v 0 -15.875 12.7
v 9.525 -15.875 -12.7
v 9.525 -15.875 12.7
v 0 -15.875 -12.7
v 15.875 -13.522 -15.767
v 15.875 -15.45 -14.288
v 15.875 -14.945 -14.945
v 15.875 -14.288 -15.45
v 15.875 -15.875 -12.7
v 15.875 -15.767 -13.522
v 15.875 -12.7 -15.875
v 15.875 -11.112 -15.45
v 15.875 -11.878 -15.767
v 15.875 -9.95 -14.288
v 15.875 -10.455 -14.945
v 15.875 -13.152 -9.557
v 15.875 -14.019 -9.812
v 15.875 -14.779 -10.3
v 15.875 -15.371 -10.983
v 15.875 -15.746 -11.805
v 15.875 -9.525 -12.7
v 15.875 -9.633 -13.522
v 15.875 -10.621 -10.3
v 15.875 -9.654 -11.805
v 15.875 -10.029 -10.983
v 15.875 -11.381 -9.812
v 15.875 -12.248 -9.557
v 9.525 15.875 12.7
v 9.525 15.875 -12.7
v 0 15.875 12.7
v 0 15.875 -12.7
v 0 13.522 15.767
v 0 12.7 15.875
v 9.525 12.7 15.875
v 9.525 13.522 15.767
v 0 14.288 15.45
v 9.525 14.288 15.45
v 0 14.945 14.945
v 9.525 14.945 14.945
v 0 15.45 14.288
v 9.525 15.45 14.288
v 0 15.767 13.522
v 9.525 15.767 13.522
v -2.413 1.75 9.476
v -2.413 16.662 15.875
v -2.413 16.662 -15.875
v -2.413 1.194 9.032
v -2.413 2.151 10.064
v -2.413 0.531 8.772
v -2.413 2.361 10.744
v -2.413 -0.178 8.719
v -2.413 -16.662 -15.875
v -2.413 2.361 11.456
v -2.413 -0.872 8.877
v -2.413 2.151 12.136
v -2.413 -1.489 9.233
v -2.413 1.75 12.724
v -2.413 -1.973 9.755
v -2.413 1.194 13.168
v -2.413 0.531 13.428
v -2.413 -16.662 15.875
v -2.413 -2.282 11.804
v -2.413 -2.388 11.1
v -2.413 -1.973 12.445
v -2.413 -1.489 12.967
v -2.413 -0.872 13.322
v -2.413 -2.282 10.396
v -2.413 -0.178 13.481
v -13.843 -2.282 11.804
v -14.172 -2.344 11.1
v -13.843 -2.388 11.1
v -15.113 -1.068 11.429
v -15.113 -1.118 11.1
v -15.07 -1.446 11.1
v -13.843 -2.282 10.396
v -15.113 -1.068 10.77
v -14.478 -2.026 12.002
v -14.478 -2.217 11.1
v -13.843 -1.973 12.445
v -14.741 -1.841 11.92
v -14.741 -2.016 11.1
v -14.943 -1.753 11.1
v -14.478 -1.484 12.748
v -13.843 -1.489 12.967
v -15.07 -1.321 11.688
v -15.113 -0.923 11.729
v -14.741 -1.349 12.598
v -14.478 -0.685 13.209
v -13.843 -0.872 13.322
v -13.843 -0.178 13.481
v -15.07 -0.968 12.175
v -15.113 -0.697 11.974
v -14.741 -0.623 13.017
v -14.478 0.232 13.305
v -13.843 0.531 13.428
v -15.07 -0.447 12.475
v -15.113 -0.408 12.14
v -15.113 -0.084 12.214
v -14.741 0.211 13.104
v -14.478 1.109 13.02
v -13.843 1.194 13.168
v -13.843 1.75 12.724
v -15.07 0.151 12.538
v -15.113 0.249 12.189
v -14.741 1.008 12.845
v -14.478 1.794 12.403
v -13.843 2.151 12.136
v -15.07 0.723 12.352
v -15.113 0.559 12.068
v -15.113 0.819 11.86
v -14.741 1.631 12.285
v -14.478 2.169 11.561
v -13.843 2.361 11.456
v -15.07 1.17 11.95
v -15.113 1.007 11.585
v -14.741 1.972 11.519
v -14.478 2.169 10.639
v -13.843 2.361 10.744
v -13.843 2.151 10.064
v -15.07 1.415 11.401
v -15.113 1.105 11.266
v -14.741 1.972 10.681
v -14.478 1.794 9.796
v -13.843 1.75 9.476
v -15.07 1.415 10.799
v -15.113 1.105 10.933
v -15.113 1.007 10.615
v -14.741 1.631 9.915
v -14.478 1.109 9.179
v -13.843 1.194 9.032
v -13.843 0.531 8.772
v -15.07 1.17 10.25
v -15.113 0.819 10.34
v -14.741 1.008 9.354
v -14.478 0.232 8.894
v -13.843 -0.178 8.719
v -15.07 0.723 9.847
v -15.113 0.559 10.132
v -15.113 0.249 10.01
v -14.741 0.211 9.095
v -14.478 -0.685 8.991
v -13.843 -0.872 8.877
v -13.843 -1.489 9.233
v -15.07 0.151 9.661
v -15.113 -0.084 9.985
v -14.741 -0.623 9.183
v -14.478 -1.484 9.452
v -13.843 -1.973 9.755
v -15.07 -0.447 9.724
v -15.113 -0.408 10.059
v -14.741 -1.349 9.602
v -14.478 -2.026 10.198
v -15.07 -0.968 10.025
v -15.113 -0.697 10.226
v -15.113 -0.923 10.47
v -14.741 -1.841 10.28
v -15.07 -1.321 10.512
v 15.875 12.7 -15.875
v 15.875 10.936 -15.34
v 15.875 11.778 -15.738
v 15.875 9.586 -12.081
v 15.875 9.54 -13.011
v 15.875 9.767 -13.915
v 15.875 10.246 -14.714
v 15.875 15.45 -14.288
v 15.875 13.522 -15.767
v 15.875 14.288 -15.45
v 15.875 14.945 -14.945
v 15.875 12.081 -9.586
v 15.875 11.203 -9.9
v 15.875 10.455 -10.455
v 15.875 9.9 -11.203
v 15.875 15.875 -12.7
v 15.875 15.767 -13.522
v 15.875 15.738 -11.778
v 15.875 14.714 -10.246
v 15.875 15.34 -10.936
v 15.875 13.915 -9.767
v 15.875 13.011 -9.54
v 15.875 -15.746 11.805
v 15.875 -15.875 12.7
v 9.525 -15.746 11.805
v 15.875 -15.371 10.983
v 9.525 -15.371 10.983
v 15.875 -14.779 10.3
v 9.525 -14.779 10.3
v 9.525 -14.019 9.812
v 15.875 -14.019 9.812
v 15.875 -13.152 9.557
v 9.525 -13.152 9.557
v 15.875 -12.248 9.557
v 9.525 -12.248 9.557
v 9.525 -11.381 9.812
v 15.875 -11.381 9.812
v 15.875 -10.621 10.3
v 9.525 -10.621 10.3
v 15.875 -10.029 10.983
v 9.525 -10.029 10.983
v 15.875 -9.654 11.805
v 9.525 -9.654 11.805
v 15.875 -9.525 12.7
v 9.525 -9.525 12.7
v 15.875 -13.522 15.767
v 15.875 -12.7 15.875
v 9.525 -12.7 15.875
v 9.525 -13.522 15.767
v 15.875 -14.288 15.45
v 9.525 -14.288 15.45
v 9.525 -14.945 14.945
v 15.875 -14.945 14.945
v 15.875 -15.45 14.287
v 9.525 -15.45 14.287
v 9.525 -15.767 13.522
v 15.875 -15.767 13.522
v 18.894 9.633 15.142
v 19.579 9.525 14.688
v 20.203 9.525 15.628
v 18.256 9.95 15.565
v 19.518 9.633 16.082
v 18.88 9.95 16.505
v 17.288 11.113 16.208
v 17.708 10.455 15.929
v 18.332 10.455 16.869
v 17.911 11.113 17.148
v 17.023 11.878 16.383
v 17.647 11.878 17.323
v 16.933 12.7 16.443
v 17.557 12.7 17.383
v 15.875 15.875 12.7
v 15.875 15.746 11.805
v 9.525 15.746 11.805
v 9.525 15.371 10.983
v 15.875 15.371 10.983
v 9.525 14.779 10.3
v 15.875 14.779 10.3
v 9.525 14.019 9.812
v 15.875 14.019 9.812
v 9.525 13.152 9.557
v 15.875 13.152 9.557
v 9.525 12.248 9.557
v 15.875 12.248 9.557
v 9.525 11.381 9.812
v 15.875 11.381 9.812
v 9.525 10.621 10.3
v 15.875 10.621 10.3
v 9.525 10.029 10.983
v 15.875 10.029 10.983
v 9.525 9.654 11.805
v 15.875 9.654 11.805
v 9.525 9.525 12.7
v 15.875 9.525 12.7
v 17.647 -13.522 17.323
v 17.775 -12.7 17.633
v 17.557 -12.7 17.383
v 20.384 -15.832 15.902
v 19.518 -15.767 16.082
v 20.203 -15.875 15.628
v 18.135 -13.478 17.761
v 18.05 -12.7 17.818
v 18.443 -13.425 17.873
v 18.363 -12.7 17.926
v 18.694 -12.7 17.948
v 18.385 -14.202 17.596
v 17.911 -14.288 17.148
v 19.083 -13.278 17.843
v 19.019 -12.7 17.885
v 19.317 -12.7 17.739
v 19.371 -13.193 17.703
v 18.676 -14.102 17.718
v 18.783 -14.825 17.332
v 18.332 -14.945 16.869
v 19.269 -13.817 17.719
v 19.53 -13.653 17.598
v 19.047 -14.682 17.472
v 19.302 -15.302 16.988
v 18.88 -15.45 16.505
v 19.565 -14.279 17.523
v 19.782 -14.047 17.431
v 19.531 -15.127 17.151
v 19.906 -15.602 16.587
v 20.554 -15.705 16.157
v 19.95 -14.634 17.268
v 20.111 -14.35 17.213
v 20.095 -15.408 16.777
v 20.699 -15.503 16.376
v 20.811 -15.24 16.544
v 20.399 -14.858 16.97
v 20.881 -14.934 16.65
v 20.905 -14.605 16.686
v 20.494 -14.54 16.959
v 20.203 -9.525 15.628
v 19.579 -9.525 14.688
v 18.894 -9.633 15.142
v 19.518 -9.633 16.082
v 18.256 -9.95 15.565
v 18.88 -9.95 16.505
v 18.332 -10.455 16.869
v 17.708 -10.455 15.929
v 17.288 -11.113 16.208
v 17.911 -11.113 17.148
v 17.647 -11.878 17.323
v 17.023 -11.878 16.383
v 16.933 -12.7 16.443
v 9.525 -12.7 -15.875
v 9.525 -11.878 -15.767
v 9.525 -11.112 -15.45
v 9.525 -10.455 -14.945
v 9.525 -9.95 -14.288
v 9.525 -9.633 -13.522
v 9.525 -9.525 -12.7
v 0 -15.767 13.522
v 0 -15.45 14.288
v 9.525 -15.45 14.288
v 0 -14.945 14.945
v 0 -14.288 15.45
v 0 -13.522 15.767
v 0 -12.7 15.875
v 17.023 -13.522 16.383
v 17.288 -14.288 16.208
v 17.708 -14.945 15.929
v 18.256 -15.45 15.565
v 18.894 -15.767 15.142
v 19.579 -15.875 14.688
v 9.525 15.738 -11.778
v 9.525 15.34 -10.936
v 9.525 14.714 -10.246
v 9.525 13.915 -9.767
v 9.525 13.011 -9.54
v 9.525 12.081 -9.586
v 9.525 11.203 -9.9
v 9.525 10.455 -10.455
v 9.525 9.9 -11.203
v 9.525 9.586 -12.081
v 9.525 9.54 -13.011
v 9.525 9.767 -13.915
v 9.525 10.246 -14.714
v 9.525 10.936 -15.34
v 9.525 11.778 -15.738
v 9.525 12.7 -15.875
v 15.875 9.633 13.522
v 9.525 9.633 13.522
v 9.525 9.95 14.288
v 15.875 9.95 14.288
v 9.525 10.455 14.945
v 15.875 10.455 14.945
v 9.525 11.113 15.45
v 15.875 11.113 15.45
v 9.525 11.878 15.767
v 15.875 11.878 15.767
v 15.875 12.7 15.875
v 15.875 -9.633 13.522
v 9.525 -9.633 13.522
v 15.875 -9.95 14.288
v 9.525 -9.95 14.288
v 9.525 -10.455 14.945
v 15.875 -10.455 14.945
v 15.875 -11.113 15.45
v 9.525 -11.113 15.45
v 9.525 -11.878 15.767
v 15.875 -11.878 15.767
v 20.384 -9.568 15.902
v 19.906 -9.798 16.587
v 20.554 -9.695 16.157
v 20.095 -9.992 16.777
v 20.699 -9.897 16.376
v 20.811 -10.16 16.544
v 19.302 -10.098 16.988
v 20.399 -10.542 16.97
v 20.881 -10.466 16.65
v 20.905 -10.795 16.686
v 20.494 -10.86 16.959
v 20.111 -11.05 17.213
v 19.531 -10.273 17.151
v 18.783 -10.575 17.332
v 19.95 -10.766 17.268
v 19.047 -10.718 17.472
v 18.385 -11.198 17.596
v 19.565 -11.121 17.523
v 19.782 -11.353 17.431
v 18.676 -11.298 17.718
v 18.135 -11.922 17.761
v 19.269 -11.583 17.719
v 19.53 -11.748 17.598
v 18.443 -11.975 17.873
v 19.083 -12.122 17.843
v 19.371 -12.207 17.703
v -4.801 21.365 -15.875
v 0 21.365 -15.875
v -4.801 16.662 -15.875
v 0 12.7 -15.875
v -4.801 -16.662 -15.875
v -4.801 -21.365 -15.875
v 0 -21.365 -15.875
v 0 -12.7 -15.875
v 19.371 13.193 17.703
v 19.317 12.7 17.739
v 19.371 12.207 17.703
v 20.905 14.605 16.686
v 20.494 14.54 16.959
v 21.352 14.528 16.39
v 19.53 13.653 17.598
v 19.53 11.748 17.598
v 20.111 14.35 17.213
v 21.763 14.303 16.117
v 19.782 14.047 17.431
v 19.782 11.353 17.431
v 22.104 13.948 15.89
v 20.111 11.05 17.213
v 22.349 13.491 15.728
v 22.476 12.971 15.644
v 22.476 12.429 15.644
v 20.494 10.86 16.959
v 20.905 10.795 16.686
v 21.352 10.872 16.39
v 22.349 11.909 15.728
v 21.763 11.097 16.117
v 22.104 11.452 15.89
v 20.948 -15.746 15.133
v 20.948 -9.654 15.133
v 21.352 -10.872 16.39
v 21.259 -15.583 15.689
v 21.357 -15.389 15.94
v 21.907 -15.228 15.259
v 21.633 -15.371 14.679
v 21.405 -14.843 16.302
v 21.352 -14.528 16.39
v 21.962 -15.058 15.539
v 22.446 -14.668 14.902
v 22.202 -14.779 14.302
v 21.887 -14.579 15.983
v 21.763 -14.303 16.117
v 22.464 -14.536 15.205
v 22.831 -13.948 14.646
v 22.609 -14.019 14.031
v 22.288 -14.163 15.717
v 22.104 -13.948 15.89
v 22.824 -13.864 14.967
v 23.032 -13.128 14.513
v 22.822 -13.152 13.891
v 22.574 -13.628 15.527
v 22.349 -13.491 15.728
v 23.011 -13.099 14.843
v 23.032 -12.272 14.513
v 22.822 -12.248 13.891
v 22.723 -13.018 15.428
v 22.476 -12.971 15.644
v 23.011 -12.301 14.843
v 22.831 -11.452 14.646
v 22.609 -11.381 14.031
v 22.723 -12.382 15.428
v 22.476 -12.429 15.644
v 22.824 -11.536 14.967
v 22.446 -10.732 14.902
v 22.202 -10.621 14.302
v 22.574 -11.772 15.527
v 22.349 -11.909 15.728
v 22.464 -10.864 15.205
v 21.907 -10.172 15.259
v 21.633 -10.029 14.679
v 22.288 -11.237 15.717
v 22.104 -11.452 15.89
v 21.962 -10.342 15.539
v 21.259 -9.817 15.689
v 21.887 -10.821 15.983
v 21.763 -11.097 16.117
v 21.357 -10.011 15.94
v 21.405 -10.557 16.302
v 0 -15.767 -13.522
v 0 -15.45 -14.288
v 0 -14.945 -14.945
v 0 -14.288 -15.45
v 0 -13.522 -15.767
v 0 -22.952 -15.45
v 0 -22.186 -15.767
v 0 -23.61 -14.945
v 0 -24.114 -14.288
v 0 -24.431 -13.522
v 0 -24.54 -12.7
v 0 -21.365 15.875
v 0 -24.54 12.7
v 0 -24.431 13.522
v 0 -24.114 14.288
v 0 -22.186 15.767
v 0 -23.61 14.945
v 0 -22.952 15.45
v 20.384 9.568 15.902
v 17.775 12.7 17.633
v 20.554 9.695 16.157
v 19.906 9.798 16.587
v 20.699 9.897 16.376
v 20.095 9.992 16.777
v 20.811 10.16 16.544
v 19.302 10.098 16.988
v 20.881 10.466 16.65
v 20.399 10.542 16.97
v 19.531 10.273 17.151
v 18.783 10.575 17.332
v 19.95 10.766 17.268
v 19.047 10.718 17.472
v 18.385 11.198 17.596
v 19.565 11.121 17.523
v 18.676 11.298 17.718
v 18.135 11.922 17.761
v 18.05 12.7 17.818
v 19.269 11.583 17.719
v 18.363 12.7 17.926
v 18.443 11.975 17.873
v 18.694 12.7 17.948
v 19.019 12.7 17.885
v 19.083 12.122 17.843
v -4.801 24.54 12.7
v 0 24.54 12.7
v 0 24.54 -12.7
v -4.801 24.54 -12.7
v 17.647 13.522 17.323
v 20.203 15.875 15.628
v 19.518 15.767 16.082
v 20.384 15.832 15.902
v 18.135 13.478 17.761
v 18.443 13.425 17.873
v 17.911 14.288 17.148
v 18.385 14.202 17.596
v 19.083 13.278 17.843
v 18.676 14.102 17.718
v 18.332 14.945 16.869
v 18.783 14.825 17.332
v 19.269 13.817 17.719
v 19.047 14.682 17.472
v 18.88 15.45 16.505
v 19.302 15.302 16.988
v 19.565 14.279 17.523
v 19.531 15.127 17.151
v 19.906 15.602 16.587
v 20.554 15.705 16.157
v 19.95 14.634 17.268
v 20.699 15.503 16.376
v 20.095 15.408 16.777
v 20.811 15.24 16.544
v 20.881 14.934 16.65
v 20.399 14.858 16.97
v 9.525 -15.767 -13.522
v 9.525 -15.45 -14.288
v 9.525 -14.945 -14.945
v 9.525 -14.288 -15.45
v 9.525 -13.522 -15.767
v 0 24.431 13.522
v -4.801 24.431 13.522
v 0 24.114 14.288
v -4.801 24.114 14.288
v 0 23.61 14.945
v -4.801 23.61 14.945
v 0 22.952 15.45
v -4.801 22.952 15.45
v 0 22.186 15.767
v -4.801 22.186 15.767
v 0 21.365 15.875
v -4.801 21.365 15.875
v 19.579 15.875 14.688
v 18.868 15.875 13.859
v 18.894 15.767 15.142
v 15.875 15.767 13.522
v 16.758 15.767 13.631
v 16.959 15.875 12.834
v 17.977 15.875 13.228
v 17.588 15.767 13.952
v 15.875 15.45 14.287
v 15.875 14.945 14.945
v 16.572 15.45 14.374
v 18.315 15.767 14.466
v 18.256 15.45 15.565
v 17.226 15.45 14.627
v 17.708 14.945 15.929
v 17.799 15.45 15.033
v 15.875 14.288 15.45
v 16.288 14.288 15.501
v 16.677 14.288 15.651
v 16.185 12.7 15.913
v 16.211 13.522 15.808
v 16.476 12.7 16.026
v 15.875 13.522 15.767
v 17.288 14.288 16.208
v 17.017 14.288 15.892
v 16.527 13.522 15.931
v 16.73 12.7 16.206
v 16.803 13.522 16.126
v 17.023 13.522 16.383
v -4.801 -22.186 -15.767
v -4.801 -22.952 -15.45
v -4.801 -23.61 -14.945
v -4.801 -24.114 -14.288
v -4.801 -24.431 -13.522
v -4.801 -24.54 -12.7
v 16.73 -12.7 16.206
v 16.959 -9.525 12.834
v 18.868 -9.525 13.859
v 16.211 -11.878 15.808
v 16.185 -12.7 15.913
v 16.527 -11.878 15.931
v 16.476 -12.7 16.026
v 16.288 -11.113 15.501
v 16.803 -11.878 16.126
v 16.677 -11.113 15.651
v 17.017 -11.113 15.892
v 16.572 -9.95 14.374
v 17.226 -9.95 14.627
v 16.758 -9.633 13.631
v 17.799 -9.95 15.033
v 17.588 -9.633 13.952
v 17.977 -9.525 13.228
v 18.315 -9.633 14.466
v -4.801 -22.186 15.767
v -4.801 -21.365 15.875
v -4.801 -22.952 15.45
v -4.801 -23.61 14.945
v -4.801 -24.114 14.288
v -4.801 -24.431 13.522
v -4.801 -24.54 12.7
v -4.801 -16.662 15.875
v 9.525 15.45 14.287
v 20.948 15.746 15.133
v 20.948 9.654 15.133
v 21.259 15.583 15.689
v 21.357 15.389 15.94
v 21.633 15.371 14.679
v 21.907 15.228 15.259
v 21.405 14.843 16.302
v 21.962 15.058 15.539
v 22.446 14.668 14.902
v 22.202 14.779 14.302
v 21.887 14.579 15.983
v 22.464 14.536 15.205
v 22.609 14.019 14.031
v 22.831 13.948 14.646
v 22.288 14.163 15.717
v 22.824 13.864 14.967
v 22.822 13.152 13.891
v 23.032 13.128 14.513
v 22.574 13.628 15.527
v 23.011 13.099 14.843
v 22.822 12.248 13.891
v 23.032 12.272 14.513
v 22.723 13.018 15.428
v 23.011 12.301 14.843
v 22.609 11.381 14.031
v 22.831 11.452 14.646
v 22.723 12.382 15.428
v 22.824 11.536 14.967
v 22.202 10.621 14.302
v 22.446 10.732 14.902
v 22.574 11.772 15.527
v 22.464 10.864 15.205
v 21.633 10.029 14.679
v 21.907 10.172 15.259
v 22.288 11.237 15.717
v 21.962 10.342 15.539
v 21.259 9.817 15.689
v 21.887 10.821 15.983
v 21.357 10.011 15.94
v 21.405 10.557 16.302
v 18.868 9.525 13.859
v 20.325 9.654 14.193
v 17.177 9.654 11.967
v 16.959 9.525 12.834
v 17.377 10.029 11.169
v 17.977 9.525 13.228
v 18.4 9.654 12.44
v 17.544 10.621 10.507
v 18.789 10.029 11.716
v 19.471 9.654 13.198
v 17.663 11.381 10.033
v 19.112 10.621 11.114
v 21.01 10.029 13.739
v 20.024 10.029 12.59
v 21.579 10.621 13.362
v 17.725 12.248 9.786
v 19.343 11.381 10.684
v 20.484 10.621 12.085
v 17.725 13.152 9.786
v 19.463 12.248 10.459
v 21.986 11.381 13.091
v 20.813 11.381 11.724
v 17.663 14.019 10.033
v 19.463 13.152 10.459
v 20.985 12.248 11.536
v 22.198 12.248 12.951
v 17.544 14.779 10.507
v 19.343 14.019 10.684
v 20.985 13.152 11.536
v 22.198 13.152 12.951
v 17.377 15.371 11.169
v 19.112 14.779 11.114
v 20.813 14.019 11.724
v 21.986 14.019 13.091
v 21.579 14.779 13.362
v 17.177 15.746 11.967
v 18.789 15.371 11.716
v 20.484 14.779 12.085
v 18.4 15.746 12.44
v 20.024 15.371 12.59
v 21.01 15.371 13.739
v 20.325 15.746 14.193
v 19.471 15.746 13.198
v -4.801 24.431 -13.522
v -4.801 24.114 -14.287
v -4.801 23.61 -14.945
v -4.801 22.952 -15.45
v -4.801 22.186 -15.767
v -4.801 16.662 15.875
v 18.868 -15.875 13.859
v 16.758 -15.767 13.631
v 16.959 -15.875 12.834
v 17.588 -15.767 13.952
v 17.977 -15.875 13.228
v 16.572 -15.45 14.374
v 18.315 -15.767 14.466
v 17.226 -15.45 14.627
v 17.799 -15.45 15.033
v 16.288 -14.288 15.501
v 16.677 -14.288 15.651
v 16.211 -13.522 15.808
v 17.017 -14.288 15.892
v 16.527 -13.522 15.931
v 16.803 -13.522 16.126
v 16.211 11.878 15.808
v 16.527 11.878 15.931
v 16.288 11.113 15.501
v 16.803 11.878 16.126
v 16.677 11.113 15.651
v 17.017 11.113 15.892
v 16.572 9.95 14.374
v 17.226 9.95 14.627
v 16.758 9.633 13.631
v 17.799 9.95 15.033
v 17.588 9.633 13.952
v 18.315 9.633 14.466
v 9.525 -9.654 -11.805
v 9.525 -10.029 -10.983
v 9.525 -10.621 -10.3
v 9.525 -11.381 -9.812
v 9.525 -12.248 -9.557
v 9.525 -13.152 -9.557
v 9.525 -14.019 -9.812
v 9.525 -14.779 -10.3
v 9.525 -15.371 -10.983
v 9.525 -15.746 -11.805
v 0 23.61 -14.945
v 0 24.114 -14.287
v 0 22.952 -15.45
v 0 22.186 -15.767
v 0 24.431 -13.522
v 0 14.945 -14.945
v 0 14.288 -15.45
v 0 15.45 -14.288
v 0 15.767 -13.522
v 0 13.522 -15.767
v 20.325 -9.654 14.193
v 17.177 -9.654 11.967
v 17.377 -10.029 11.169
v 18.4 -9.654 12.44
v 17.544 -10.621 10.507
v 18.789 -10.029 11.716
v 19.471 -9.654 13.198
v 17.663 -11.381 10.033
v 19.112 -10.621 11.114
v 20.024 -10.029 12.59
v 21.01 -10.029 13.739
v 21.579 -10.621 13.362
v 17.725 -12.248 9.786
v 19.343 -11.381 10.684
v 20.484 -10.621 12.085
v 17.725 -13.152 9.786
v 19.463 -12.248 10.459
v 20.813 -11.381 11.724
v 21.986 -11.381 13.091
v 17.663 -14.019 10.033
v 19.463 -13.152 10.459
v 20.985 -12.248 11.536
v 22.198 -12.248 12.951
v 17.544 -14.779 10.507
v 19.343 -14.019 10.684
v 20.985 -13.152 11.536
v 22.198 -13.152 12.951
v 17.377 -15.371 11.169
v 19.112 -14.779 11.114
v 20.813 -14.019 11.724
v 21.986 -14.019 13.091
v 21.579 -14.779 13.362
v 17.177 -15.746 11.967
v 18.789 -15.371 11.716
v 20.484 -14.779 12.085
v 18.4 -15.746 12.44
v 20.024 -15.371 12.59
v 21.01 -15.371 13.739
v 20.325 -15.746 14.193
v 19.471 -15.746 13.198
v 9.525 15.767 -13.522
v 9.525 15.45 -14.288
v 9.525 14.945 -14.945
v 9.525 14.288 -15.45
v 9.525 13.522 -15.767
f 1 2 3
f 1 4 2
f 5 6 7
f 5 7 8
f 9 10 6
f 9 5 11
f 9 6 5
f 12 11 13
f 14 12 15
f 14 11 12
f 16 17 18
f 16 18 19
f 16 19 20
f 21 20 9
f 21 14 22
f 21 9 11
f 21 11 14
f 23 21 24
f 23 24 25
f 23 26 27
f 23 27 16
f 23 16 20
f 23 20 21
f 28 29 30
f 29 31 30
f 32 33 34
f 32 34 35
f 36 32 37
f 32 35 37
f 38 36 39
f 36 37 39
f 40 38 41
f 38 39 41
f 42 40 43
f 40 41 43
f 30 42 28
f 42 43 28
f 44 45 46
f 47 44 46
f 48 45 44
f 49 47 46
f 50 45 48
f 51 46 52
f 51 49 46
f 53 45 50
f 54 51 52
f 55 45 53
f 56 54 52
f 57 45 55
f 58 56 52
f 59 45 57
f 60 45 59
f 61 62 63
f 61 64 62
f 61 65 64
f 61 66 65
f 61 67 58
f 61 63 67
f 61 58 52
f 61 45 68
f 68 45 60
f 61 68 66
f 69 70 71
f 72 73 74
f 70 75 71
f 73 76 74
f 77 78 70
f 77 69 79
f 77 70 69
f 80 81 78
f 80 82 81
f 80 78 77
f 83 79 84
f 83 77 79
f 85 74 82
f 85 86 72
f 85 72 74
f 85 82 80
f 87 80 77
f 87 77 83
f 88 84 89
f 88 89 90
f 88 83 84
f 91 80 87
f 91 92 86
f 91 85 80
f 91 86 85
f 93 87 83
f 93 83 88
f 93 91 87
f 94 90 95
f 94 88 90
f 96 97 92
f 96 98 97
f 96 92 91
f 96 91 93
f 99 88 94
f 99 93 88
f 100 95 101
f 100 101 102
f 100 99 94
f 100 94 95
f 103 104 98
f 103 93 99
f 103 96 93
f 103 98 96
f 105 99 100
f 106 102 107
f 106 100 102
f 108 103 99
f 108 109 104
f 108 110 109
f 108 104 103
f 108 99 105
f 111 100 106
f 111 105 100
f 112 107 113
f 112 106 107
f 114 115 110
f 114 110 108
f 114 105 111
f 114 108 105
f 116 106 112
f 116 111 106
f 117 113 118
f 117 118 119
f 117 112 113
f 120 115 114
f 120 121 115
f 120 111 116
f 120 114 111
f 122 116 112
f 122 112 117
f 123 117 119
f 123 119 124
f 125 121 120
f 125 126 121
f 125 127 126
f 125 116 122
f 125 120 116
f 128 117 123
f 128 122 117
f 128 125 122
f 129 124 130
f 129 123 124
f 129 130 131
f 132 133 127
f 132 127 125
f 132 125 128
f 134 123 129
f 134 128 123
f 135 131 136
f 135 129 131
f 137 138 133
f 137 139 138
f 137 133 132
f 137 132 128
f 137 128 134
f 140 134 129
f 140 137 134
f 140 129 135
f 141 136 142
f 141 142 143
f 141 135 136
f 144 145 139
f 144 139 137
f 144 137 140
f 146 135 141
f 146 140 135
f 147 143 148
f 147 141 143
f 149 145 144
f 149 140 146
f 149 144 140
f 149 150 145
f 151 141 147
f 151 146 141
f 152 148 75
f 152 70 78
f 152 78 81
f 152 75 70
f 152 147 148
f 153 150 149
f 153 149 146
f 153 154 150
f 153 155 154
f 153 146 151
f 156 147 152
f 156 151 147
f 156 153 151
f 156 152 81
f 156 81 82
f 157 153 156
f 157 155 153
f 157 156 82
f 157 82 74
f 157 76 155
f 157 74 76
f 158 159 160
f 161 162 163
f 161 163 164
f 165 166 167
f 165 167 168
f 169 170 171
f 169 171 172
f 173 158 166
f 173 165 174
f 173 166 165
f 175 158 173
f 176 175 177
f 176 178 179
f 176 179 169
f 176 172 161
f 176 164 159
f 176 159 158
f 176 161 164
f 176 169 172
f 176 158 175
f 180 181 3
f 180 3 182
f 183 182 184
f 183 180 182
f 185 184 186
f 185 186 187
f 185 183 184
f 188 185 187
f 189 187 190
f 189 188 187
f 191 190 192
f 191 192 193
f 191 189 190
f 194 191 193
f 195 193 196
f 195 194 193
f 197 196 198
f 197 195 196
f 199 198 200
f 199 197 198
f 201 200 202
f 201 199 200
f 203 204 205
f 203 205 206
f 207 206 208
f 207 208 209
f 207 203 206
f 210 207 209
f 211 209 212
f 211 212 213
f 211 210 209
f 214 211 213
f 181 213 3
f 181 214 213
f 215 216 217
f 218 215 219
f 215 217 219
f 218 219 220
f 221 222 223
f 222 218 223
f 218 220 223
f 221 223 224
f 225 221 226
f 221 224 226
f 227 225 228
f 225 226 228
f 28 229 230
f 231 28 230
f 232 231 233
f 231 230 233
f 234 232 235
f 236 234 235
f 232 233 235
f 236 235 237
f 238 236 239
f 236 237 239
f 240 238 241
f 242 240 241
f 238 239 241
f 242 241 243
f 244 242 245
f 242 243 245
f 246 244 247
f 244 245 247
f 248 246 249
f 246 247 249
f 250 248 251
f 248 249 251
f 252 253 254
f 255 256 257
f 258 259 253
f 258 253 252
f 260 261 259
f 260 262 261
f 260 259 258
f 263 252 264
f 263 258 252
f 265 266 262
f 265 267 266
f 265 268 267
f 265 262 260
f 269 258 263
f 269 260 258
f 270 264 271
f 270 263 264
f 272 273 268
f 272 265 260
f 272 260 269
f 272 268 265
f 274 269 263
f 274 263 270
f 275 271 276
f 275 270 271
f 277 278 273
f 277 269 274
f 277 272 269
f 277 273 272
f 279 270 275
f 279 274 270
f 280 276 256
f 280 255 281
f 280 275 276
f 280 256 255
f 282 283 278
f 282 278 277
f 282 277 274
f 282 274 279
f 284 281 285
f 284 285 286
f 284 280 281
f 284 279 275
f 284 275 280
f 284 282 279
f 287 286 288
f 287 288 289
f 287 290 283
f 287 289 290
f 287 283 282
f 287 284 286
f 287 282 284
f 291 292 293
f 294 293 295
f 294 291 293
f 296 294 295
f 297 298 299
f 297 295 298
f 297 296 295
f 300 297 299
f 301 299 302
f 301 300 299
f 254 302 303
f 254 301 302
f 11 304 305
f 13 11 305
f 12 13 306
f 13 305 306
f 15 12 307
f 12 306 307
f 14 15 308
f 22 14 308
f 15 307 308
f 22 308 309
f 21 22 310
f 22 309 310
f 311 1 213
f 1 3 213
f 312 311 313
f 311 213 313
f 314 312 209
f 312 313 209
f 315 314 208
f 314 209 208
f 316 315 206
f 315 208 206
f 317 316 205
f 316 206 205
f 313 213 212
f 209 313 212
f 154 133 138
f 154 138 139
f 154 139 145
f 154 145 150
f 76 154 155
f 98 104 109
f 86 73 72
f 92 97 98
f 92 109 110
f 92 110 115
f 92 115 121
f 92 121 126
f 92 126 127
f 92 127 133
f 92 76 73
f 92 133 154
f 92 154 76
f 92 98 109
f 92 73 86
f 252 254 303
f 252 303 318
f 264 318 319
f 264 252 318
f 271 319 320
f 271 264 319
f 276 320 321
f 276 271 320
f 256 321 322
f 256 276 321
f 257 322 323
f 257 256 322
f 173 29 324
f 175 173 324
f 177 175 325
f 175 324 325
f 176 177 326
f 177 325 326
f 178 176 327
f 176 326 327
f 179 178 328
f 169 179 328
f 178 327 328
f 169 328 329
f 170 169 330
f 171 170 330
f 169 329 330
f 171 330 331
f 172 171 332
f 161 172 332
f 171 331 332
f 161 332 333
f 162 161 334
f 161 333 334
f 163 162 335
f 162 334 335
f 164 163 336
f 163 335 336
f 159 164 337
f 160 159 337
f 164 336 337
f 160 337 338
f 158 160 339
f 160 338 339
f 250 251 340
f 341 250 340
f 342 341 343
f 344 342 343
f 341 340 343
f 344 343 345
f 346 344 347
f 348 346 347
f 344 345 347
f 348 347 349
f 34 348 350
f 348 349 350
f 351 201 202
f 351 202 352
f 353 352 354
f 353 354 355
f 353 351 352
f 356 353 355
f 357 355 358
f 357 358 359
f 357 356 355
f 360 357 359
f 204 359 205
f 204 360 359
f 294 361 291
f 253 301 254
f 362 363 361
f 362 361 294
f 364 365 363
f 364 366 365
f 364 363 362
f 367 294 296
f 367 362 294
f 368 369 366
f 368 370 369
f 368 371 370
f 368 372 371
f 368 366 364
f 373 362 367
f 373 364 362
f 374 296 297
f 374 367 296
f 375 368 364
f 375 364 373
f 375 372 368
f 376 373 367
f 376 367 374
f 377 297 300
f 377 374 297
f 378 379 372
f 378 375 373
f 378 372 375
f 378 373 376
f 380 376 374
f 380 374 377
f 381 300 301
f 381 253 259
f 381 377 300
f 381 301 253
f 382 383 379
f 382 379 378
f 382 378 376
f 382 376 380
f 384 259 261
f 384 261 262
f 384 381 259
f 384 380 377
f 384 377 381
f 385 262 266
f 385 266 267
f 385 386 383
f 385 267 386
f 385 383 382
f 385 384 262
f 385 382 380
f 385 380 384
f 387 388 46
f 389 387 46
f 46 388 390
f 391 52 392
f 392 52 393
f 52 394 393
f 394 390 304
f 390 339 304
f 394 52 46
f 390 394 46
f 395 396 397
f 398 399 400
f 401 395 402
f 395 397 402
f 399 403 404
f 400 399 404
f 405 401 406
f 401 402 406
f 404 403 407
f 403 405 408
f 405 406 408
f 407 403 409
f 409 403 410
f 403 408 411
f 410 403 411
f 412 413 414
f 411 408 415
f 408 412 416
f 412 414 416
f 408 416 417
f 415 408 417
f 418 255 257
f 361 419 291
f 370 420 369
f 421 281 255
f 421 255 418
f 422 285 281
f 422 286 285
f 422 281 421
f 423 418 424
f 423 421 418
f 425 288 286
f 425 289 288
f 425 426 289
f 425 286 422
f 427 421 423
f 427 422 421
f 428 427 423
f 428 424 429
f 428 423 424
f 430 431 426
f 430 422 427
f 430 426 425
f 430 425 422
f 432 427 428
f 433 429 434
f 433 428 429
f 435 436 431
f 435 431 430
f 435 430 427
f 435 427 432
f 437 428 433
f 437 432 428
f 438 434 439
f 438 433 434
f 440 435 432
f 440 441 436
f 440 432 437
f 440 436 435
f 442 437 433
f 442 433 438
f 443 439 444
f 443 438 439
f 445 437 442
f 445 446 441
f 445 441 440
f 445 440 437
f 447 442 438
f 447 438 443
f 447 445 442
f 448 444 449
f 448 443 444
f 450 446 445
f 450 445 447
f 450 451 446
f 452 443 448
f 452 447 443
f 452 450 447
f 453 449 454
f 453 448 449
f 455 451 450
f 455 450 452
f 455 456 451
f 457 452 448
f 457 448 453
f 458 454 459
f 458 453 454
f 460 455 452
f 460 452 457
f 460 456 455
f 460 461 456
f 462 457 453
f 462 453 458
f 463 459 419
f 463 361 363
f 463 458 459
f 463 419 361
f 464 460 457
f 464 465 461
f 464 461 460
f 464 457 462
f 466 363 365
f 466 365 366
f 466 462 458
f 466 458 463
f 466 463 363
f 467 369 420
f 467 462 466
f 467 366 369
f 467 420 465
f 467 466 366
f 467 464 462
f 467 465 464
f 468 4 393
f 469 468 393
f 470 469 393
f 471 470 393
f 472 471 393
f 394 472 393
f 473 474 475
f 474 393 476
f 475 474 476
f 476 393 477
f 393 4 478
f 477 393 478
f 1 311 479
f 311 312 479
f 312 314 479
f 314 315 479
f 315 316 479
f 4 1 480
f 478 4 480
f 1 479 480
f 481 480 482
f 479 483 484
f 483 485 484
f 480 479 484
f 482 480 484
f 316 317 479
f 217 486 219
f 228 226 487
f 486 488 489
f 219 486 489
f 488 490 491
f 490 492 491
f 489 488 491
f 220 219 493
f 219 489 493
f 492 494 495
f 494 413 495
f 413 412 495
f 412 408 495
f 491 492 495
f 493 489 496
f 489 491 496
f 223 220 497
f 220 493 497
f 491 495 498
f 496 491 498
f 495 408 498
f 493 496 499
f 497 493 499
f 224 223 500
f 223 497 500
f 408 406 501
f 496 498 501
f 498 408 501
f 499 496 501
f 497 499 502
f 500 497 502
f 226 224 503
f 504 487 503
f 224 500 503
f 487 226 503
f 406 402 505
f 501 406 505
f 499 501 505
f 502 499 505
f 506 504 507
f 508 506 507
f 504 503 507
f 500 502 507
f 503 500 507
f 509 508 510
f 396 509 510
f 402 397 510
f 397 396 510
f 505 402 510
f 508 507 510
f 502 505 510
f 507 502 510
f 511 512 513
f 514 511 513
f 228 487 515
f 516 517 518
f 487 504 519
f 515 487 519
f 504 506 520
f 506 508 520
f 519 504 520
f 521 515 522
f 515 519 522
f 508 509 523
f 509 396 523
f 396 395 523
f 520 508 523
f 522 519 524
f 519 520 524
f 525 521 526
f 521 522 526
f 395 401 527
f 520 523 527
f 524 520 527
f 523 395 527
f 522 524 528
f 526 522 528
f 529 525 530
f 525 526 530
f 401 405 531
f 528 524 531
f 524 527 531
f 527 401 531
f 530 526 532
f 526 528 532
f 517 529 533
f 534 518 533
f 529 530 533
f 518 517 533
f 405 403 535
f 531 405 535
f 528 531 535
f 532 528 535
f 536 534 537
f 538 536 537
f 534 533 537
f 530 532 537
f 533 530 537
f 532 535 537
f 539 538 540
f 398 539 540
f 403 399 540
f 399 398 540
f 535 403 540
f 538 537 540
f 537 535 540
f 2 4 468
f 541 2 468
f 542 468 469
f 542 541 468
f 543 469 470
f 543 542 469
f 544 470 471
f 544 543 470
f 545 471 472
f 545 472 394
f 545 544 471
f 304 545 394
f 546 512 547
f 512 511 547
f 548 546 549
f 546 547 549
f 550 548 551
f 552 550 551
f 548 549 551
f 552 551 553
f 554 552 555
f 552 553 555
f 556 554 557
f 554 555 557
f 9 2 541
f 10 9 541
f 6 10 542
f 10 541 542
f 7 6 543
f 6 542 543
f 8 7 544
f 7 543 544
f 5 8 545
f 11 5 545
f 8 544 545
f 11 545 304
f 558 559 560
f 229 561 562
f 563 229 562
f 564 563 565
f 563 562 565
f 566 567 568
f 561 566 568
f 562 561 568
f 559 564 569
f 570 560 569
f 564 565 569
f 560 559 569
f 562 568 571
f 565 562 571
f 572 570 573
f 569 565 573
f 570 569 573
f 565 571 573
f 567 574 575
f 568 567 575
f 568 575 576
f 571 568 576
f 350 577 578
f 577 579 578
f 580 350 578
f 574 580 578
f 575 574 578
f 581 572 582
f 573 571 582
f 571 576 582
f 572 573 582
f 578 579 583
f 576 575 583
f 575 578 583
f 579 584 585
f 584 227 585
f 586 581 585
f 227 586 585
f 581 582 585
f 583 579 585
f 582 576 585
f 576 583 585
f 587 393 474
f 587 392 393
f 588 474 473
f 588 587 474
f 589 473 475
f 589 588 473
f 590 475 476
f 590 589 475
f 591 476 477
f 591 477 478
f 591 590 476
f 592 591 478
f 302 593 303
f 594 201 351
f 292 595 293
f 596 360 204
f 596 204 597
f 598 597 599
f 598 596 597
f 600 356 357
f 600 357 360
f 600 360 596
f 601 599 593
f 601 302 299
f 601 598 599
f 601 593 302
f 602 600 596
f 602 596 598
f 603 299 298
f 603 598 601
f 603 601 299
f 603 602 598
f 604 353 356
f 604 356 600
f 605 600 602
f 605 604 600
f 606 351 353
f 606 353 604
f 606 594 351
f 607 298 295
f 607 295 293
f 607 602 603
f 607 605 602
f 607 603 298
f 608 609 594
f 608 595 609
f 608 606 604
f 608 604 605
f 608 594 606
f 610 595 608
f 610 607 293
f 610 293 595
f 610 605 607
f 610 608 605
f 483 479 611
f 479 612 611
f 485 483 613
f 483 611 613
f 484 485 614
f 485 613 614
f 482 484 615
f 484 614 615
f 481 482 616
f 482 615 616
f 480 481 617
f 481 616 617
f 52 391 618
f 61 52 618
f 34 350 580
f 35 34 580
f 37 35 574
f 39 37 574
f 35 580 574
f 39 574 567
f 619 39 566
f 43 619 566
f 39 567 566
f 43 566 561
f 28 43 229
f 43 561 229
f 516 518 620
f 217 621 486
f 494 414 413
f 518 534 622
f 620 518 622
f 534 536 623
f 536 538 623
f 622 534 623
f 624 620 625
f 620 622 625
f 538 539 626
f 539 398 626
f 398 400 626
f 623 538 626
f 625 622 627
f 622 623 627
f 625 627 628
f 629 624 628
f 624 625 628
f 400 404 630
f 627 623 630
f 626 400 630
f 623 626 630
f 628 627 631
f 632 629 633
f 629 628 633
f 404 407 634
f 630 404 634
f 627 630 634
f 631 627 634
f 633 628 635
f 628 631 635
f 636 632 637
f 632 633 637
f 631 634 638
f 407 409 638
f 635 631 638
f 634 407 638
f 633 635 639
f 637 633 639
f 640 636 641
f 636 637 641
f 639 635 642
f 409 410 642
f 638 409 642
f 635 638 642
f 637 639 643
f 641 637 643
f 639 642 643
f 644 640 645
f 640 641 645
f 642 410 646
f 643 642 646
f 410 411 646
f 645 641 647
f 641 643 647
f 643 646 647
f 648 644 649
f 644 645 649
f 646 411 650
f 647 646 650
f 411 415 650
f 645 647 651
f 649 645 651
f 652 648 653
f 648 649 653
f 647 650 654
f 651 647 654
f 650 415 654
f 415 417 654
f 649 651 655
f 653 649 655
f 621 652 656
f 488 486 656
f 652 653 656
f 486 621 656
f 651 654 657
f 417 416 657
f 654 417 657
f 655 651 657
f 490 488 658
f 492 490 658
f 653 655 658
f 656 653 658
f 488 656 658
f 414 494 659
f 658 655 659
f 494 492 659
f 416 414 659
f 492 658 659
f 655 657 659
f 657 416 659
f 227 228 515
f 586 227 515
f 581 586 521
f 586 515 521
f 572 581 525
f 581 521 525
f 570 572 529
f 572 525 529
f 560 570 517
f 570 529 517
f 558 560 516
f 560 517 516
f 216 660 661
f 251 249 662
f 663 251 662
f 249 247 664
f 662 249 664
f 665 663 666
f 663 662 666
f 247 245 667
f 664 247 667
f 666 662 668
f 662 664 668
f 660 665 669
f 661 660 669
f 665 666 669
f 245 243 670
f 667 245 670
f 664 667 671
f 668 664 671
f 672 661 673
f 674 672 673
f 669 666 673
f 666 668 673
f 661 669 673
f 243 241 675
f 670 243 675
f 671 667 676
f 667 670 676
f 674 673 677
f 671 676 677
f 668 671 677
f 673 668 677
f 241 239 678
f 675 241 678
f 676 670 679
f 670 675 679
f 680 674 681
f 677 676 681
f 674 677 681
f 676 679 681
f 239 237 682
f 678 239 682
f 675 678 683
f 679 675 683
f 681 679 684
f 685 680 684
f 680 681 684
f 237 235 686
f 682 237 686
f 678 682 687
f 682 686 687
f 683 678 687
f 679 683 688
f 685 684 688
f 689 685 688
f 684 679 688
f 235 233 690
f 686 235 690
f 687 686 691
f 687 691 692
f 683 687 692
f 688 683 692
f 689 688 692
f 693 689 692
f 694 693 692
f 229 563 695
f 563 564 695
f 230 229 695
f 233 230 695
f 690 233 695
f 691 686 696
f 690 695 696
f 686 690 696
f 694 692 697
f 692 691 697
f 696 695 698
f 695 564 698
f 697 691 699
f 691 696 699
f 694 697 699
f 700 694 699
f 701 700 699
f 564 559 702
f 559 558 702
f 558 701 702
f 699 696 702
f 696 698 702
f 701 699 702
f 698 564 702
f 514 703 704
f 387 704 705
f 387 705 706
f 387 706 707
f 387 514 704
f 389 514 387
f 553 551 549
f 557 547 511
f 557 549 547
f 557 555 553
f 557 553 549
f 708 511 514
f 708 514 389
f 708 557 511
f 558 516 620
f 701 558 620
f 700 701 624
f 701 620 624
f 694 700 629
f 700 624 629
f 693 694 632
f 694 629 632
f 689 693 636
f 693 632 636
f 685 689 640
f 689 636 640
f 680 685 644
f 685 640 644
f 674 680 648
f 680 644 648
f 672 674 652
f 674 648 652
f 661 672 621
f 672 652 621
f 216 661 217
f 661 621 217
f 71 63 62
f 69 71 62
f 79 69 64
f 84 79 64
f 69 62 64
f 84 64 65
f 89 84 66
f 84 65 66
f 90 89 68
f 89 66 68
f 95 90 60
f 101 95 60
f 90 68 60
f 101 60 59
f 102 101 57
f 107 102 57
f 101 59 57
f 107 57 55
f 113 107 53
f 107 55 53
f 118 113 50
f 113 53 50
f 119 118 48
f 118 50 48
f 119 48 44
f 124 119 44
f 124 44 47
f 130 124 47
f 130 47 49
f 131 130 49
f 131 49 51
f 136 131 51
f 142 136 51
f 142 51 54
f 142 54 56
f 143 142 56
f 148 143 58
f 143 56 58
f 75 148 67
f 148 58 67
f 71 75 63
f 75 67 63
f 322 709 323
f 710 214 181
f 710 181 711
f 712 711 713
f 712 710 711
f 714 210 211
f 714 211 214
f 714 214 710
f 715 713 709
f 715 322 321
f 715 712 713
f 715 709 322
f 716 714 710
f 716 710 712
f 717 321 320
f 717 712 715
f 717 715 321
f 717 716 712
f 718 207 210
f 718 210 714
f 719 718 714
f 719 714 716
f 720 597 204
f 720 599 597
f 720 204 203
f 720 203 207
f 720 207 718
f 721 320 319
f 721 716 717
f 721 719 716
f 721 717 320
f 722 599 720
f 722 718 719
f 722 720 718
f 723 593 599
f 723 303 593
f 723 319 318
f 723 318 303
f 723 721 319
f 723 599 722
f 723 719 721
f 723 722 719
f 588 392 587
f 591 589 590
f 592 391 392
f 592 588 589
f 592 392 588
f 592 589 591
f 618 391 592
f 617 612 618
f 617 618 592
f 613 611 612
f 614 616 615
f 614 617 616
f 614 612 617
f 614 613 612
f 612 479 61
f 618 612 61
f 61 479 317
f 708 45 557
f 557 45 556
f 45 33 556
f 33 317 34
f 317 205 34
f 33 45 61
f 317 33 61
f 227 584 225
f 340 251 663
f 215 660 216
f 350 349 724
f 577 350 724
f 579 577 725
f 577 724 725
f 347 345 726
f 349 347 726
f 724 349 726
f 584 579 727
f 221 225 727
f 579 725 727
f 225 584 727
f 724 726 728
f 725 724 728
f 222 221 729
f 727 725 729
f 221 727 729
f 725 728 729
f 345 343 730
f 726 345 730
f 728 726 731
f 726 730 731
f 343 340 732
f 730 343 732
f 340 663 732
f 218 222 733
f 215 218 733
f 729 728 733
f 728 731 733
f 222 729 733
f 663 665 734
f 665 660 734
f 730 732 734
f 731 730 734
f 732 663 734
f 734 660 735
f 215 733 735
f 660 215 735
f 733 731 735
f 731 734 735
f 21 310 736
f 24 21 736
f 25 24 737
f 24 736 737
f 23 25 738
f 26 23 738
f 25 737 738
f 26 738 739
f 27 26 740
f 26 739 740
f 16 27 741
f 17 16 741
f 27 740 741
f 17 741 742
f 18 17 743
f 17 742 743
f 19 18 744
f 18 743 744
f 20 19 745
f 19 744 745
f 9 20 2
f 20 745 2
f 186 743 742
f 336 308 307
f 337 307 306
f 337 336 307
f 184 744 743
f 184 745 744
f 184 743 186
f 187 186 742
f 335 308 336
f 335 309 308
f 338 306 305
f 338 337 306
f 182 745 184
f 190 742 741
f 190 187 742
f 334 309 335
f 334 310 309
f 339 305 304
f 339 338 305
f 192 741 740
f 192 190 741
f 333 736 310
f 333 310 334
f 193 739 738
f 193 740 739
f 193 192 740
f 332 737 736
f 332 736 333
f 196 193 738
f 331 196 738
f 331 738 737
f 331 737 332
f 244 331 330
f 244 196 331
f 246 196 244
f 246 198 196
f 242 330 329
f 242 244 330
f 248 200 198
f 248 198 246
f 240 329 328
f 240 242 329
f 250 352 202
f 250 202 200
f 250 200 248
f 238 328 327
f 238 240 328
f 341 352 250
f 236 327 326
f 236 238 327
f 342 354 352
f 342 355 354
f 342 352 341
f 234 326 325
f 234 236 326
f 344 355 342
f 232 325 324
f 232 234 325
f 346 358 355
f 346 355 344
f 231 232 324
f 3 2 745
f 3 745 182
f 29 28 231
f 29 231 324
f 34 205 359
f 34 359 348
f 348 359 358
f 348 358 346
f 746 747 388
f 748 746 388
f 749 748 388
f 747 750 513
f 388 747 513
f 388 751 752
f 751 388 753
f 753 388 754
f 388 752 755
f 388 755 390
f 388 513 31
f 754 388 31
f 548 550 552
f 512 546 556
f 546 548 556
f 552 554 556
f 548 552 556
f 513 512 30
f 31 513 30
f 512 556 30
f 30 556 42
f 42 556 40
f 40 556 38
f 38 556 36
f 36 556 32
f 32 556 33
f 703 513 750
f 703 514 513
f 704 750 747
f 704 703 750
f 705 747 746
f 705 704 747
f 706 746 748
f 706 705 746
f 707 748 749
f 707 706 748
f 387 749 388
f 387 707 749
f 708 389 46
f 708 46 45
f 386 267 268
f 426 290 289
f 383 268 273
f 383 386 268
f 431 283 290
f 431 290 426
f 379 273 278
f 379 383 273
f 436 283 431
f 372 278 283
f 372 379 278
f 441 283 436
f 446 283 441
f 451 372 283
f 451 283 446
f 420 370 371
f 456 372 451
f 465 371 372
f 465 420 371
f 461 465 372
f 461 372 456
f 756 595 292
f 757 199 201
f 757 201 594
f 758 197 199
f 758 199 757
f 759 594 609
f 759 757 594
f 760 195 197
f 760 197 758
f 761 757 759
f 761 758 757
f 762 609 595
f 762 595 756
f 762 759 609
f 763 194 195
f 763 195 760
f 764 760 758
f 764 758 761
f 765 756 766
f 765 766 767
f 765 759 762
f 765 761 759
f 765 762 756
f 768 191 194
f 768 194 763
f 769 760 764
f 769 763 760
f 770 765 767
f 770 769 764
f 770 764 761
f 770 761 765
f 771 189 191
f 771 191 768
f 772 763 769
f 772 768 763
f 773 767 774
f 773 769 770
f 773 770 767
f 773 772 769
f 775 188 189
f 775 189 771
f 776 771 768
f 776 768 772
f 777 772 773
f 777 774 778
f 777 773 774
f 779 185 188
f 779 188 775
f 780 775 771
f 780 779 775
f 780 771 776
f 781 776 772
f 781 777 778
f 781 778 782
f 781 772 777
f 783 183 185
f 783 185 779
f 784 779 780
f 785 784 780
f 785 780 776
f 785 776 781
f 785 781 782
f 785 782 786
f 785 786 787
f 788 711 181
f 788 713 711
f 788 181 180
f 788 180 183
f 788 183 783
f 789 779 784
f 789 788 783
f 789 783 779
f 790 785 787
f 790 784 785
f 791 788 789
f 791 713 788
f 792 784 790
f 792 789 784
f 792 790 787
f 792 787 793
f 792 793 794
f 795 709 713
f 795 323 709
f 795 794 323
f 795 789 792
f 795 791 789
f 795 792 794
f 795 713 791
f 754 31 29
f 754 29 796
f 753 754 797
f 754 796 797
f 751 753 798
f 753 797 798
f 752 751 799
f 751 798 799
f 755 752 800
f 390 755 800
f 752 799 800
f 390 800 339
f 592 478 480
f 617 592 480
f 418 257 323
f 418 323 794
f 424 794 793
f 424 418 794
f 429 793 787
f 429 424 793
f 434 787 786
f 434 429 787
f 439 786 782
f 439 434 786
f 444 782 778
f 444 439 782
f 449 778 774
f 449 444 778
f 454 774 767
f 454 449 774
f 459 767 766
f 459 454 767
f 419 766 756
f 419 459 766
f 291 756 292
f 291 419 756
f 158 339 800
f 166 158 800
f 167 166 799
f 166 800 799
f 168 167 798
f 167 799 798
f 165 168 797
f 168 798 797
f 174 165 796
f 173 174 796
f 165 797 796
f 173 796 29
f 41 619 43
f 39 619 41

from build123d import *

# Parameters (mm, degrees)
F0_W      = 31.75
F0_H      = 31.75
F1_DEPTH  = 9.525
F7_R      = 1.27
F11_DEPTH = 6.35
F12_R     = 3.1749
F14_DEPTH = 4.8006
F15_W     = 33.3248
F15_H     = 31.75
F16_DEPTH = 2.3876
F17_R     = 2.3876
F18_DEPTH = 12.7
F19_R     = 3.175
F20_R     = 1.27


# Not quite as in the source:
# - a fillet or chamfer is up to 0.001 mm smaller than in the source, because OpenCascade refuses the exact size


with BuildPart() as f1:
    # F0 (on Right) → F1 (new body)
    with BuildSketch(Plane.YZ):
        Rectangle(F0_W, F0_H)
    extrude(amount=F1_DEPTH)

    # F6: sweep along a path in F5
    with BuildLine(Plane.XZ.offset(12.7)) as f6_path:
        Line((9.525, 9.525), (15.875, 9.525))
        ThreePointArc((15.875, 9.525), (19.4783384003, 10.4308096264), (22.225, 12.9328865162))
        Line((22.225, 12.9328865162), (23.5505334947, 14.9312034475))
    # F2 (on face) → F6 (sweep)
    with BuildSketch(Plane.YZ.offset(9.525)):
        with BuildLine():
            ThreePointArc((-15.875, 12.7), (-12.7, 9.525), (-9.525, 12.7))
            ThreePointArc((-9.525, 12.7), (-10.4549359718, 14.9450640323), (-12.7000000057, 15.875))
            ThreePointArc((-12.7000000057, 15.875), (-14.9450640323, 14.9450640282), (-15.875, 12.7))
        make_face()
    sweep(path=f6_path.line)

    # F7
    f7_edges = [f1.edges().sort_by_distance(p)[0] for p in [
        (20.9047, -15.875, 16.686251),
    ]]
    fillet(f7_edges, radius=F7_R)

    # F10: F1 across plane


with BuildPart() as f1_1:
    add(f1.part)
    add(f1.part.mirror(Plane(origin=(0, 0, 15.875), x_dir=(1, 0, 0), z_dir=(0, -1, 0))))

    # F2 (on face) → F11 (join)
    with BuildSketch(Plane.YZ.offset(9.525)):
        with BuildLine():
            ThreePointArc((-9.525, -12.7), (-12.7, -9.525), (-15.875, -12.7))
            ThreePointArc((-15.875, -12.7), (-14.9450640303, -14.9450640303), (-12.7, -15.875))
            ThreePointArc((-12.7, -15.875), (-10.4549359697, -14.9450640303), (-9.525, -12.7))
        make_face()
        with BuildLine():
            ThreePointArc((12.7, -15.875), (14.9450640303, -14.9450640303), (15.875, -12.7))
            ThreePointArc((15.875, -12.7), (10.4549359697, -10.4549359697), (12.7, -15.875))
        make_face()
    extrude(amount=F11_DEPTH)

    # F12 (radius 3.175 in the source; OpenCascade refuses exactly that, so slightly less here)
    f12_edges = [f1_1.edges().sort_by_distance(p)[0] for p in [
        (4.7625, -15.875, 15.875),
        (4.7625, -15.875, -15.875),
        (4.7625, 15.875, -15.875),
        (4.7625, 15.875, 15.875),
    ]]
    fillet(f12_edges, radius=F12_R)

    # F13 (on face) → F14 (join)
    with BuildSketch(Plane(origin=(0, 0, 0), x_dir=(0, -1, 0), z_dir=(-1, 0, 0))):
        with BuildLine():
            Line((-12.7001, 15.875), (-24.5396645936, 15.875))
            Line((-24.5396645936, 15.875), (-24.5396645936, -15.875))
            Line((-24.5396645936, -15.875), (-12.7001, -15.875))
            ThreePointArc((-12.7001, -15.875), (-14.9450933196, -14.9450933196), (-15.875, -12.7001))
            Line((-15.875, -12.7001), (-15.875, 12.7001))
            ThreePointArc((-15.875, 12.7001), (-14.9450933196, 14.9450933196), (-12.7001, 15.875))
        make_face()
        with BuildLine():
            Line((12.7001, 15.875), (-12.7001, 15.875))
            ThreePointArc((-12.7001, 15.875), (-14.9450933196, 14.9450933196), (-15.875, 12.7001))
            Line((-15.875, 12.7001), (-15.875, -12.7001))
            ThreePointArc((-15.875, -12.7001), (-14.9450933196, -14.9450933196), (-12.7001, -15.875))
            Line((-12.7001, -15.875), (12.7001, -15.875))
            ThreePointArc((12.7001, -15.875), (14.9450933196, -14.9450933196), (15.875, -12.7001))
            Line((15.875, -12.7001), (15.875, 12.7001))
            ThreePointArc((15.875, 12.7001), (14.9450933196, 14.9450933196), (12.7001, 15.875))
        make_face()
        with BuildLine():
            Line((24.5396645936, 15.875), (12.7001, 15.875))
            ThreePointArc((12.7001, 15.875), (14.9450933196, 14.9450933196), (15.875, 12.7001))
            Line((15.875, 12.7001), (15.875, -12.7001))
            ThreePointArc((15.875, -12.7001), (14.9450933196, -14.9450933196), (12.7001, -15.875))
            Line((12.7001, -15.875), (24.5396645936, -15.875))
            Line((24.5396645936, -15.875), (24.5396645936, 15.875))
        make_face()
    extrude(amount=F14_DEPTH)

    # F15 (on face) → F16 (cut)
    with BuildSketch(Plane(origin=(-4.8006, 0, 0), x_dir=(0, -1, 0), z_dir=(-1, 0, 0))):
        Rectangle(F15_W, F15_H)
    extrude(amount=-F16_DEPTH, mode=Mode.SUBTRACT)

    # F17 (on face) → F18 (join)
    with BuildSketch(Plane(origin=(-2.413, 0, 0), x_dir=(0, -1, 0), z_dir=(-1, 0, 0))):
        with Locations((0, 11.0998)):
            Circle(F17_R)
    extrude(amount=F18_DEPTH)

    # F19
    f19_edges = [f1_1.edges().sort_by_distance(p)[0] for p in [
        (-2.4003, 24.539665, 15.875),
        (-2.4003, 24.539665, -15.875),
        (-2.4003, -24.539665, -15.875),
        (-2.4003, -24.539665, 15.875),
    ]]
    fillet(f19_edges, radius=F19_R)

    # F20
    f20_edges = [f1_1.edges().sort_by_distance(p)[0] for p in [
        (-15.113, 2.3876, 11.0998),
    ]]
    fillet(f20_edges, radius=F20_R)


solid = f1_1.part
